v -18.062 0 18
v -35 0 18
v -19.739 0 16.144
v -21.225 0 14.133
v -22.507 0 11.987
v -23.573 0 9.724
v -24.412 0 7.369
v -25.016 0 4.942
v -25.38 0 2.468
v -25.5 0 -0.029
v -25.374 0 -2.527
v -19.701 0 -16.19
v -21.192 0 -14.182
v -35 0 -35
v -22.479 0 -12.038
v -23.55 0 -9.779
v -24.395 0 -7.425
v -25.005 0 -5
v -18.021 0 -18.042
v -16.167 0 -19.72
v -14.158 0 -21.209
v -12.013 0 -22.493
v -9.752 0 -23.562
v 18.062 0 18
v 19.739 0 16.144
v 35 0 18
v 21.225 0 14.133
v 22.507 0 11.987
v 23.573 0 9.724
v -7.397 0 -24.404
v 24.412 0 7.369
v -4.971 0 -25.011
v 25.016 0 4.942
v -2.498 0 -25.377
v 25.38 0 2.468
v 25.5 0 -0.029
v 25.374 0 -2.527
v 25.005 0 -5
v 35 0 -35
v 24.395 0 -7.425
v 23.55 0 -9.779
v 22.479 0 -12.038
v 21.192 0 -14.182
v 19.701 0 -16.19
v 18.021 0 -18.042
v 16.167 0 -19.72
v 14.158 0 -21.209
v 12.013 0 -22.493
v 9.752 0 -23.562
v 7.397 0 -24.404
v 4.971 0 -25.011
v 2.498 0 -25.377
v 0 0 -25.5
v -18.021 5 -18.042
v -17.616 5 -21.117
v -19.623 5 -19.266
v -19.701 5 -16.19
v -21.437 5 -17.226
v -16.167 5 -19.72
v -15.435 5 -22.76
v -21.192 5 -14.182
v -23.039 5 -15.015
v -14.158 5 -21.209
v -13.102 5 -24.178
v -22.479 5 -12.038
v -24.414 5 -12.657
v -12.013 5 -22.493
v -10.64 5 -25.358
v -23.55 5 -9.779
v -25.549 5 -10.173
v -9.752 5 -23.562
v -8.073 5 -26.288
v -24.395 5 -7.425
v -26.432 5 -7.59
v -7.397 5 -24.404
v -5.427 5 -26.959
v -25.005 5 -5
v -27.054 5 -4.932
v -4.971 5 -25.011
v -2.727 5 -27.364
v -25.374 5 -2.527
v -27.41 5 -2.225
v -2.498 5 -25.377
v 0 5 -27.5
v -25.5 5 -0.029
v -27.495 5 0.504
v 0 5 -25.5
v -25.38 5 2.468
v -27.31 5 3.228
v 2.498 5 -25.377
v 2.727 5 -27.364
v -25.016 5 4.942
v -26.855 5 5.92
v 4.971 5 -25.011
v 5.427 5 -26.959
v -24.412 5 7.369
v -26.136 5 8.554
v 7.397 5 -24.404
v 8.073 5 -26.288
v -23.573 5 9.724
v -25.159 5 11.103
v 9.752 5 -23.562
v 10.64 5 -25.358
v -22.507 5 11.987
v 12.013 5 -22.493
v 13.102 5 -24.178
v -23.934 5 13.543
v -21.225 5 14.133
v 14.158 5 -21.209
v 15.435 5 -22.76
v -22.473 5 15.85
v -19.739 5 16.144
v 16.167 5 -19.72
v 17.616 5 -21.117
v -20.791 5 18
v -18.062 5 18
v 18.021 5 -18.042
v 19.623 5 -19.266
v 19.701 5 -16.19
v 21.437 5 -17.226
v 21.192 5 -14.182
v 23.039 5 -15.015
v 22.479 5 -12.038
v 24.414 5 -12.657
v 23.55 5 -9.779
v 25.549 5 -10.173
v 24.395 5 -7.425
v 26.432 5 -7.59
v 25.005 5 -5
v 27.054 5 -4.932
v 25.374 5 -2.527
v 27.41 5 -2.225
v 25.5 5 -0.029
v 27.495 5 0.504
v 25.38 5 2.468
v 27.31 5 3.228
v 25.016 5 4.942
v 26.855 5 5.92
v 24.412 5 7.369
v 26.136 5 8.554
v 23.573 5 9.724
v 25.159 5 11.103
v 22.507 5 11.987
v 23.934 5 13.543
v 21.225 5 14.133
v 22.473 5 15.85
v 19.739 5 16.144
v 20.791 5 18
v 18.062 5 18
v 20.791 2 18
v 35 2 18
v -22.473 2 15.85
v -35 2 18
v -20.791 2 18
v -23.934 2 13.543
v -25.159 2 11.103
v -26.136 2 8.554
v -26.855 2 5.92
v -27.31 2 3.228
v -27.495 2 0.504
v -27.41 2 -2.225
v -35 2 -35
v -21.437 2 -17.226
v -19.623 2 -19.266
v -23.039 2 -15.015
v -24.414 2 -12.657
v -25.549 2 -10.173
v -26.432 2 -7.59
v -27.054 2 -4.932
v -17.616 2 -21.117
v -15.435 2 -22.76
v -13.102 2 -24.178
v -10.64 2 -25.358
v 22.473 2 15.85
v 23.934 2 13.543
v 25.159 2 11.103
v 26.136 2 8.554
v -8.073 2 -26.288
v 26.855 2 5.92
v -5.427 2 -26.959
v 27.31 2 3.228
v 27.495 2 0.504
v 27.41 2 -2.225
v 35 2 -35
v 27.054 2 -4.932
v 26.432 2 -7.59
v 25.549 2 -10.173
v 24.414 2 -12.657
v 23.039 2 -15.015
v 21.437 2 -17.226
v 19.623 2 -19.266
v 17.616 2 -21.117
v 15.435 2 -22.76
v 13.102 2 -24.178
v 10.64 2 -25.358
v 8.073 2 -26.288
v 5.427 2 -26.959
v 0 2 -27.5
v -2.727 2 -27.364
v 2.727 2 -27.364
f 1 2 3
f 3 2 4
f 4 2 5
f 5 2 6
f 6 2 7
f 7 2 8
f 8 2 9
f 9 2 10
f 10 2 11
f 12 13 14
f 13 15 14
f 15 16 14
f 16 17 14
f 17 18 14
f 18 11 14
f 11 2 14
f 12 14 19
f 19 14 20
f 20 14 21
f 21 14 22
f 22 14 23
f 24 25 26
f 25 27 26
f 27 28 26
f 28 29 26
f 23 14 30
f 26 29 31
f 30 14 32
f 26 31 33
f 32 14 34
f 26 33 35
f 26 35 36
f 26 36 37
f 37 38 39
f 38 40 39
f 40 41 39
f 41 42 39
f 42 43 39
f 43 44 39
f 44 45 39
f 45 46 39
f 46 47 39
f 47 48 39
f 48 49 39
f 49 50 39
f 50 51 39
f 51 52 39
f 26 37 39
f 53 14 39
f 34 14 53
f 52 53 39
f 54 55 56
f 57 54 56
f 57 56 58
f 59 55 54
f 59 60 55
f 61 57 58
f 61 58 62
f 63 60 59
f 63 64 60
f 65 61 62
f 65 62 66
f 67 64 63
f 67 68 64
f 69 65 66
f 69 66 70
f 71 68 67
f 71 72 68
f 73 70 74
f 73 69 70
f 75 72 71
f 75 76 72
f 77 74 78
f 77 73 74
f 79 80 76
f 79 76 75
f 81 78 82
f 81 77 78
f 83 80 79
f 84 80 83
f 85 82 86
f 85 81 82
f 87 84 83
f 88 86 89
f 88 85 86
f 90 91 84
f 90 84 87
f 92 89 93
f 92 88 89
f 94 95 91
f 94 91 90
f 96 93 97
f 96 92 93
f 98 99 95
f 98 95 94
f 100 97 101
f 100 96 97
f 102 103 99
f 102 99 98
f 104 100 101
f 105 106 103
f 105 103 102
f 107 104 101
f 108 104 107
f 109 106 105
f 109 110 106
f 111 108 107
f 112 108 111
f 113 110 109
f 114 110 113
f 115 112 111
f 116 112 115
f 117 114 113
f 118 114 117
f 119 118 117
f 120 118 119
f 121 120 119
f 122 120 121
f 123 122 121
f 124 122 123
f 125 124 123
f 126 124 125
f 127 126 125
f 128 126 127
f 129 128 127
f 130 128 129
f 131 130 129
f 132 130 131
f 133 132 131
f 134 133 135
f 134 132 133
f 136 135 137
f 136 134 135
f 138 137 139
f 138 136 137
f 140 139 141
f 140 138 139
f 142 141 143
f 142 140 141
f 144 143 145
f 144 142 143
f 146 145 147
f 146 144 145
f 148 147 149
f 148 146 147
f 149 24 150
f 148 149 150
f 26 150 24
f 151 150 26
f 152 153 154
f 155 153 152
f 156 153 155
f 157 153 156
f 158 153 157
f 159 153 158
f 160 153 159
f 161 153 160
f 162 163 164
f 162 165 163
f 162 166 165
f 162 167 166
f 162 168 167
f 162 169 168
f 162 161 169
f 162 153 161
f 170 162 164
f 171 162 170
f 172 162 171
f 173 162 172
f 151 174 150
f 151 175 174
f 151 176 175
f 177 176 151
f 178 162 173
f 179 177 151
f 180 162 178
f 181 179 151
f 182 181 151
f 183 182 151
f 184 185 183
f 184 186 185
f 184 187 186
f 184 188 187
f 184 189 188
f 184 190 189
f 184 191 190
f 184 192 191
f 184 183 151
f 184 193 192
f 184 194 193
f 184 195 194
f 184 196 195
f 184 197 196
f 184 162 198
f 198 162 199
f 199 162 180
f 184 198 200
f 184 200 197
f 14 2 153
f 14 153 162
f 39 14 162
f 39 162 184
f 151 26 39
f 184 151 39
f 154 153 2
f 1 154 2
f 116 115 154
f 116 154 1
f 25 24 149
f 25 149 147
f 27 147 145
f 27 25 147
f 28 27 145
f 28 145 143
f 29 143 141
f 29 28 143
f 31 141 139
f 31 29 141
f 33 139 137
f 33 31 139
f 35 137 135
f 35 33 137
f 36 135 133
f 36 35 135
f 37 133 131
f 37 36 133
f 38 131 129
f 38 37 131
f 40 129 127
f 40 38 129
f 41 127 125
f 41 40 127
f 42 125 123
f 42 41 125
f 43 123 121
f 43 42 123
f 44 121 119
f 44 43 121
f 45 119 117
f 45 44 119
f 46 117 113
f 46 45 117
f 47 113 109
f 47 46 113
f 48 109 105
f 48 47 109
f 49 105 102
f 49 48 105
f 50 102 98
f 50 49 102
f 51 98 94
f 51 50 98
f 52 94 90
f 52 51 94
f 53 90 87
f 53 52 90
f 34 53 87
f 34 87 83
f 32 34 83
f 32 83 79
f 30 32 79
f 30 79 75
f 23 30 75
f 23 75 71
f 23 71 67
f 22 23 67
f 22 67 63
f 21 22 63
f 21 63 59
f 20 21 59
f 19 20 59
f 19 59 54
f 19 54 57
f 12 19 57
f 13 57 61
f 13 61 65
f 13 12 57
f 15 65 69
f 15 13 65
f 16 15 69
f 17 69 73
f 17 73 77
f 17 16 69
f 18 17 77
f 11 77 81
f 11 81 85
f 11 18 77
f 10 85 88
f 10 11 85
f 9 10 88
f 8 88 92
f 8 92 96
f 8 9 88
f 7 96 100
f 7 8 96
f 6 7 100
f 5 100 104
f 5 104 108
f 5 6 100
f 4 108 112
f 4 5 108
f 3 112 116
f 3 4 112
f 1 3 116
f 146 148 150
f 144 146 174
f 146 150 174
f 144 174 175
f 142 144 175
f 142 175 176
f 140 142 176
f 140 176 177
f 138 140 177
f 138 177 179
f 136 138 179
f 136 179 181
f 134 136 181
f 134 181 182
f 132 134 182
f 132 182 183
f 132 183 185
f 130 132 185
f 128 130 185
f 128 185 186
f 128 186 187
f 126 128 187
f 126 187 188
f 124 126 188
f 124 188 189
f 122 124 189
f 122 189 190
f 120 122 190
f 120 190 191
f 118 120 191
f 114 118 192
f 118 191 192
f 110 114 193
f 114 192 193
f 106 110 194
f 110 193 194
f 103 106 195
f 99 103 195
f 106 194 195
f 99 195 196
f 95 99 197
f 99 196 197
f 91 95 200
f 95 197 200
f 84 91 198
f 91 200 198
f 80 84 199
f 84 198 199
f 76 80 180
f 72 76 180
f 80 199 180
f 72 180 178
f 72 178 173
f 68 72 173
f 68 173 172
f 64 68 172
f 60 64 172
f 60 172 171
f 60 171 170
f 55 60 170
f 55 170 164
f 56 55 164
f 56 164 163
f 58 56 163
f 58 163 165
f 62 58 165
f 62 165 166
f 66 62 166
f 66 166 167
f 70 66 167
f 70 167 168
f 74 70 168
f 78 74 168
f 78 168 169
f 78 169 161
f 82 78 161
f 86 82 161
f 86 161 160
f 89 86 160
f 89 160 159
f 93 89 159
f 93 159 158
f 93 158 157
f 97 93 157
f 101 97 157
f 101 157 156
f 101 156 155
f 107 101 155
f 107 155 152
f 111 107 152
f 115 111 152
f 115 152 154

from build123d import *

# Parameters (mm, degrees)
CROQUIS1_W              = 70
CROQUIS1_H              = 70
CROQUIS1_R              = 25.5
SALIENTE_EXTRUIR1_DEPTH = 2
CROQUIS2_R              = 27.5
CROQUIS2_R_2            = 25.5
SALIENTE_EXTRUIR2_DEPTH = 3
CROQUIS3_W              = 70
CROQUIS3_H              = 17
CORTAR_EXTRUIR1_DEPTH   = 50.749371855


with BuildPart() as part:
    # Croquis1 → Saliente-Extruir1 (new body)
    with BuildSketch(Plane(origin=(0, 0, 0), x_dir=(1, 0, 0), z_dir=(0, 1, 0))):
        Rectangle(CROQUIS1_W, CROQUIS1_H)
        with Locations(Location((0, 0, 0), (0, 0, 270))):
            Circle(CROQUIS1_R, mode=Mode.SUBTRACT)
    extrude(amount=SALIENTE_EXTRUIR1_DEPTH)

    # Croquis2 → Saliente-Extruir2 (add)
    with BuildSketch(Plane(origin=(0, 2, 0), x_dir=(1, 0, 0), z_dir=(0, 1, 0))):
        with Locations(Location((0, 0, 0), (0, 0, 270))):
            Circle(CROQUIS2_R)
        with Locations(Location((0, 0, 0), (0, 0, 270))):
            Circle(CROQUIS2_R_2, mode=Mode.SUBTRACT)
    extrude(amount=SALIENTE_EXTRUIR2_DEPTH)

    # Croquis3 → Cortar-Extruir1 (cut, through all)
    with BuildSketch(Plane(origin=(0, 5, 0), x_dir=(1, 0, 0), z_dir=(0, 1, 0))):
        with Locations((0, -26.5)):
            Rectangle(CROQUIS3_W, CROQUIS3_H)
    extrude(amount=-CORTAR_EXTRUIR1_DEPTH, mode=Mode.SUBTRACT)


solid = part.part
